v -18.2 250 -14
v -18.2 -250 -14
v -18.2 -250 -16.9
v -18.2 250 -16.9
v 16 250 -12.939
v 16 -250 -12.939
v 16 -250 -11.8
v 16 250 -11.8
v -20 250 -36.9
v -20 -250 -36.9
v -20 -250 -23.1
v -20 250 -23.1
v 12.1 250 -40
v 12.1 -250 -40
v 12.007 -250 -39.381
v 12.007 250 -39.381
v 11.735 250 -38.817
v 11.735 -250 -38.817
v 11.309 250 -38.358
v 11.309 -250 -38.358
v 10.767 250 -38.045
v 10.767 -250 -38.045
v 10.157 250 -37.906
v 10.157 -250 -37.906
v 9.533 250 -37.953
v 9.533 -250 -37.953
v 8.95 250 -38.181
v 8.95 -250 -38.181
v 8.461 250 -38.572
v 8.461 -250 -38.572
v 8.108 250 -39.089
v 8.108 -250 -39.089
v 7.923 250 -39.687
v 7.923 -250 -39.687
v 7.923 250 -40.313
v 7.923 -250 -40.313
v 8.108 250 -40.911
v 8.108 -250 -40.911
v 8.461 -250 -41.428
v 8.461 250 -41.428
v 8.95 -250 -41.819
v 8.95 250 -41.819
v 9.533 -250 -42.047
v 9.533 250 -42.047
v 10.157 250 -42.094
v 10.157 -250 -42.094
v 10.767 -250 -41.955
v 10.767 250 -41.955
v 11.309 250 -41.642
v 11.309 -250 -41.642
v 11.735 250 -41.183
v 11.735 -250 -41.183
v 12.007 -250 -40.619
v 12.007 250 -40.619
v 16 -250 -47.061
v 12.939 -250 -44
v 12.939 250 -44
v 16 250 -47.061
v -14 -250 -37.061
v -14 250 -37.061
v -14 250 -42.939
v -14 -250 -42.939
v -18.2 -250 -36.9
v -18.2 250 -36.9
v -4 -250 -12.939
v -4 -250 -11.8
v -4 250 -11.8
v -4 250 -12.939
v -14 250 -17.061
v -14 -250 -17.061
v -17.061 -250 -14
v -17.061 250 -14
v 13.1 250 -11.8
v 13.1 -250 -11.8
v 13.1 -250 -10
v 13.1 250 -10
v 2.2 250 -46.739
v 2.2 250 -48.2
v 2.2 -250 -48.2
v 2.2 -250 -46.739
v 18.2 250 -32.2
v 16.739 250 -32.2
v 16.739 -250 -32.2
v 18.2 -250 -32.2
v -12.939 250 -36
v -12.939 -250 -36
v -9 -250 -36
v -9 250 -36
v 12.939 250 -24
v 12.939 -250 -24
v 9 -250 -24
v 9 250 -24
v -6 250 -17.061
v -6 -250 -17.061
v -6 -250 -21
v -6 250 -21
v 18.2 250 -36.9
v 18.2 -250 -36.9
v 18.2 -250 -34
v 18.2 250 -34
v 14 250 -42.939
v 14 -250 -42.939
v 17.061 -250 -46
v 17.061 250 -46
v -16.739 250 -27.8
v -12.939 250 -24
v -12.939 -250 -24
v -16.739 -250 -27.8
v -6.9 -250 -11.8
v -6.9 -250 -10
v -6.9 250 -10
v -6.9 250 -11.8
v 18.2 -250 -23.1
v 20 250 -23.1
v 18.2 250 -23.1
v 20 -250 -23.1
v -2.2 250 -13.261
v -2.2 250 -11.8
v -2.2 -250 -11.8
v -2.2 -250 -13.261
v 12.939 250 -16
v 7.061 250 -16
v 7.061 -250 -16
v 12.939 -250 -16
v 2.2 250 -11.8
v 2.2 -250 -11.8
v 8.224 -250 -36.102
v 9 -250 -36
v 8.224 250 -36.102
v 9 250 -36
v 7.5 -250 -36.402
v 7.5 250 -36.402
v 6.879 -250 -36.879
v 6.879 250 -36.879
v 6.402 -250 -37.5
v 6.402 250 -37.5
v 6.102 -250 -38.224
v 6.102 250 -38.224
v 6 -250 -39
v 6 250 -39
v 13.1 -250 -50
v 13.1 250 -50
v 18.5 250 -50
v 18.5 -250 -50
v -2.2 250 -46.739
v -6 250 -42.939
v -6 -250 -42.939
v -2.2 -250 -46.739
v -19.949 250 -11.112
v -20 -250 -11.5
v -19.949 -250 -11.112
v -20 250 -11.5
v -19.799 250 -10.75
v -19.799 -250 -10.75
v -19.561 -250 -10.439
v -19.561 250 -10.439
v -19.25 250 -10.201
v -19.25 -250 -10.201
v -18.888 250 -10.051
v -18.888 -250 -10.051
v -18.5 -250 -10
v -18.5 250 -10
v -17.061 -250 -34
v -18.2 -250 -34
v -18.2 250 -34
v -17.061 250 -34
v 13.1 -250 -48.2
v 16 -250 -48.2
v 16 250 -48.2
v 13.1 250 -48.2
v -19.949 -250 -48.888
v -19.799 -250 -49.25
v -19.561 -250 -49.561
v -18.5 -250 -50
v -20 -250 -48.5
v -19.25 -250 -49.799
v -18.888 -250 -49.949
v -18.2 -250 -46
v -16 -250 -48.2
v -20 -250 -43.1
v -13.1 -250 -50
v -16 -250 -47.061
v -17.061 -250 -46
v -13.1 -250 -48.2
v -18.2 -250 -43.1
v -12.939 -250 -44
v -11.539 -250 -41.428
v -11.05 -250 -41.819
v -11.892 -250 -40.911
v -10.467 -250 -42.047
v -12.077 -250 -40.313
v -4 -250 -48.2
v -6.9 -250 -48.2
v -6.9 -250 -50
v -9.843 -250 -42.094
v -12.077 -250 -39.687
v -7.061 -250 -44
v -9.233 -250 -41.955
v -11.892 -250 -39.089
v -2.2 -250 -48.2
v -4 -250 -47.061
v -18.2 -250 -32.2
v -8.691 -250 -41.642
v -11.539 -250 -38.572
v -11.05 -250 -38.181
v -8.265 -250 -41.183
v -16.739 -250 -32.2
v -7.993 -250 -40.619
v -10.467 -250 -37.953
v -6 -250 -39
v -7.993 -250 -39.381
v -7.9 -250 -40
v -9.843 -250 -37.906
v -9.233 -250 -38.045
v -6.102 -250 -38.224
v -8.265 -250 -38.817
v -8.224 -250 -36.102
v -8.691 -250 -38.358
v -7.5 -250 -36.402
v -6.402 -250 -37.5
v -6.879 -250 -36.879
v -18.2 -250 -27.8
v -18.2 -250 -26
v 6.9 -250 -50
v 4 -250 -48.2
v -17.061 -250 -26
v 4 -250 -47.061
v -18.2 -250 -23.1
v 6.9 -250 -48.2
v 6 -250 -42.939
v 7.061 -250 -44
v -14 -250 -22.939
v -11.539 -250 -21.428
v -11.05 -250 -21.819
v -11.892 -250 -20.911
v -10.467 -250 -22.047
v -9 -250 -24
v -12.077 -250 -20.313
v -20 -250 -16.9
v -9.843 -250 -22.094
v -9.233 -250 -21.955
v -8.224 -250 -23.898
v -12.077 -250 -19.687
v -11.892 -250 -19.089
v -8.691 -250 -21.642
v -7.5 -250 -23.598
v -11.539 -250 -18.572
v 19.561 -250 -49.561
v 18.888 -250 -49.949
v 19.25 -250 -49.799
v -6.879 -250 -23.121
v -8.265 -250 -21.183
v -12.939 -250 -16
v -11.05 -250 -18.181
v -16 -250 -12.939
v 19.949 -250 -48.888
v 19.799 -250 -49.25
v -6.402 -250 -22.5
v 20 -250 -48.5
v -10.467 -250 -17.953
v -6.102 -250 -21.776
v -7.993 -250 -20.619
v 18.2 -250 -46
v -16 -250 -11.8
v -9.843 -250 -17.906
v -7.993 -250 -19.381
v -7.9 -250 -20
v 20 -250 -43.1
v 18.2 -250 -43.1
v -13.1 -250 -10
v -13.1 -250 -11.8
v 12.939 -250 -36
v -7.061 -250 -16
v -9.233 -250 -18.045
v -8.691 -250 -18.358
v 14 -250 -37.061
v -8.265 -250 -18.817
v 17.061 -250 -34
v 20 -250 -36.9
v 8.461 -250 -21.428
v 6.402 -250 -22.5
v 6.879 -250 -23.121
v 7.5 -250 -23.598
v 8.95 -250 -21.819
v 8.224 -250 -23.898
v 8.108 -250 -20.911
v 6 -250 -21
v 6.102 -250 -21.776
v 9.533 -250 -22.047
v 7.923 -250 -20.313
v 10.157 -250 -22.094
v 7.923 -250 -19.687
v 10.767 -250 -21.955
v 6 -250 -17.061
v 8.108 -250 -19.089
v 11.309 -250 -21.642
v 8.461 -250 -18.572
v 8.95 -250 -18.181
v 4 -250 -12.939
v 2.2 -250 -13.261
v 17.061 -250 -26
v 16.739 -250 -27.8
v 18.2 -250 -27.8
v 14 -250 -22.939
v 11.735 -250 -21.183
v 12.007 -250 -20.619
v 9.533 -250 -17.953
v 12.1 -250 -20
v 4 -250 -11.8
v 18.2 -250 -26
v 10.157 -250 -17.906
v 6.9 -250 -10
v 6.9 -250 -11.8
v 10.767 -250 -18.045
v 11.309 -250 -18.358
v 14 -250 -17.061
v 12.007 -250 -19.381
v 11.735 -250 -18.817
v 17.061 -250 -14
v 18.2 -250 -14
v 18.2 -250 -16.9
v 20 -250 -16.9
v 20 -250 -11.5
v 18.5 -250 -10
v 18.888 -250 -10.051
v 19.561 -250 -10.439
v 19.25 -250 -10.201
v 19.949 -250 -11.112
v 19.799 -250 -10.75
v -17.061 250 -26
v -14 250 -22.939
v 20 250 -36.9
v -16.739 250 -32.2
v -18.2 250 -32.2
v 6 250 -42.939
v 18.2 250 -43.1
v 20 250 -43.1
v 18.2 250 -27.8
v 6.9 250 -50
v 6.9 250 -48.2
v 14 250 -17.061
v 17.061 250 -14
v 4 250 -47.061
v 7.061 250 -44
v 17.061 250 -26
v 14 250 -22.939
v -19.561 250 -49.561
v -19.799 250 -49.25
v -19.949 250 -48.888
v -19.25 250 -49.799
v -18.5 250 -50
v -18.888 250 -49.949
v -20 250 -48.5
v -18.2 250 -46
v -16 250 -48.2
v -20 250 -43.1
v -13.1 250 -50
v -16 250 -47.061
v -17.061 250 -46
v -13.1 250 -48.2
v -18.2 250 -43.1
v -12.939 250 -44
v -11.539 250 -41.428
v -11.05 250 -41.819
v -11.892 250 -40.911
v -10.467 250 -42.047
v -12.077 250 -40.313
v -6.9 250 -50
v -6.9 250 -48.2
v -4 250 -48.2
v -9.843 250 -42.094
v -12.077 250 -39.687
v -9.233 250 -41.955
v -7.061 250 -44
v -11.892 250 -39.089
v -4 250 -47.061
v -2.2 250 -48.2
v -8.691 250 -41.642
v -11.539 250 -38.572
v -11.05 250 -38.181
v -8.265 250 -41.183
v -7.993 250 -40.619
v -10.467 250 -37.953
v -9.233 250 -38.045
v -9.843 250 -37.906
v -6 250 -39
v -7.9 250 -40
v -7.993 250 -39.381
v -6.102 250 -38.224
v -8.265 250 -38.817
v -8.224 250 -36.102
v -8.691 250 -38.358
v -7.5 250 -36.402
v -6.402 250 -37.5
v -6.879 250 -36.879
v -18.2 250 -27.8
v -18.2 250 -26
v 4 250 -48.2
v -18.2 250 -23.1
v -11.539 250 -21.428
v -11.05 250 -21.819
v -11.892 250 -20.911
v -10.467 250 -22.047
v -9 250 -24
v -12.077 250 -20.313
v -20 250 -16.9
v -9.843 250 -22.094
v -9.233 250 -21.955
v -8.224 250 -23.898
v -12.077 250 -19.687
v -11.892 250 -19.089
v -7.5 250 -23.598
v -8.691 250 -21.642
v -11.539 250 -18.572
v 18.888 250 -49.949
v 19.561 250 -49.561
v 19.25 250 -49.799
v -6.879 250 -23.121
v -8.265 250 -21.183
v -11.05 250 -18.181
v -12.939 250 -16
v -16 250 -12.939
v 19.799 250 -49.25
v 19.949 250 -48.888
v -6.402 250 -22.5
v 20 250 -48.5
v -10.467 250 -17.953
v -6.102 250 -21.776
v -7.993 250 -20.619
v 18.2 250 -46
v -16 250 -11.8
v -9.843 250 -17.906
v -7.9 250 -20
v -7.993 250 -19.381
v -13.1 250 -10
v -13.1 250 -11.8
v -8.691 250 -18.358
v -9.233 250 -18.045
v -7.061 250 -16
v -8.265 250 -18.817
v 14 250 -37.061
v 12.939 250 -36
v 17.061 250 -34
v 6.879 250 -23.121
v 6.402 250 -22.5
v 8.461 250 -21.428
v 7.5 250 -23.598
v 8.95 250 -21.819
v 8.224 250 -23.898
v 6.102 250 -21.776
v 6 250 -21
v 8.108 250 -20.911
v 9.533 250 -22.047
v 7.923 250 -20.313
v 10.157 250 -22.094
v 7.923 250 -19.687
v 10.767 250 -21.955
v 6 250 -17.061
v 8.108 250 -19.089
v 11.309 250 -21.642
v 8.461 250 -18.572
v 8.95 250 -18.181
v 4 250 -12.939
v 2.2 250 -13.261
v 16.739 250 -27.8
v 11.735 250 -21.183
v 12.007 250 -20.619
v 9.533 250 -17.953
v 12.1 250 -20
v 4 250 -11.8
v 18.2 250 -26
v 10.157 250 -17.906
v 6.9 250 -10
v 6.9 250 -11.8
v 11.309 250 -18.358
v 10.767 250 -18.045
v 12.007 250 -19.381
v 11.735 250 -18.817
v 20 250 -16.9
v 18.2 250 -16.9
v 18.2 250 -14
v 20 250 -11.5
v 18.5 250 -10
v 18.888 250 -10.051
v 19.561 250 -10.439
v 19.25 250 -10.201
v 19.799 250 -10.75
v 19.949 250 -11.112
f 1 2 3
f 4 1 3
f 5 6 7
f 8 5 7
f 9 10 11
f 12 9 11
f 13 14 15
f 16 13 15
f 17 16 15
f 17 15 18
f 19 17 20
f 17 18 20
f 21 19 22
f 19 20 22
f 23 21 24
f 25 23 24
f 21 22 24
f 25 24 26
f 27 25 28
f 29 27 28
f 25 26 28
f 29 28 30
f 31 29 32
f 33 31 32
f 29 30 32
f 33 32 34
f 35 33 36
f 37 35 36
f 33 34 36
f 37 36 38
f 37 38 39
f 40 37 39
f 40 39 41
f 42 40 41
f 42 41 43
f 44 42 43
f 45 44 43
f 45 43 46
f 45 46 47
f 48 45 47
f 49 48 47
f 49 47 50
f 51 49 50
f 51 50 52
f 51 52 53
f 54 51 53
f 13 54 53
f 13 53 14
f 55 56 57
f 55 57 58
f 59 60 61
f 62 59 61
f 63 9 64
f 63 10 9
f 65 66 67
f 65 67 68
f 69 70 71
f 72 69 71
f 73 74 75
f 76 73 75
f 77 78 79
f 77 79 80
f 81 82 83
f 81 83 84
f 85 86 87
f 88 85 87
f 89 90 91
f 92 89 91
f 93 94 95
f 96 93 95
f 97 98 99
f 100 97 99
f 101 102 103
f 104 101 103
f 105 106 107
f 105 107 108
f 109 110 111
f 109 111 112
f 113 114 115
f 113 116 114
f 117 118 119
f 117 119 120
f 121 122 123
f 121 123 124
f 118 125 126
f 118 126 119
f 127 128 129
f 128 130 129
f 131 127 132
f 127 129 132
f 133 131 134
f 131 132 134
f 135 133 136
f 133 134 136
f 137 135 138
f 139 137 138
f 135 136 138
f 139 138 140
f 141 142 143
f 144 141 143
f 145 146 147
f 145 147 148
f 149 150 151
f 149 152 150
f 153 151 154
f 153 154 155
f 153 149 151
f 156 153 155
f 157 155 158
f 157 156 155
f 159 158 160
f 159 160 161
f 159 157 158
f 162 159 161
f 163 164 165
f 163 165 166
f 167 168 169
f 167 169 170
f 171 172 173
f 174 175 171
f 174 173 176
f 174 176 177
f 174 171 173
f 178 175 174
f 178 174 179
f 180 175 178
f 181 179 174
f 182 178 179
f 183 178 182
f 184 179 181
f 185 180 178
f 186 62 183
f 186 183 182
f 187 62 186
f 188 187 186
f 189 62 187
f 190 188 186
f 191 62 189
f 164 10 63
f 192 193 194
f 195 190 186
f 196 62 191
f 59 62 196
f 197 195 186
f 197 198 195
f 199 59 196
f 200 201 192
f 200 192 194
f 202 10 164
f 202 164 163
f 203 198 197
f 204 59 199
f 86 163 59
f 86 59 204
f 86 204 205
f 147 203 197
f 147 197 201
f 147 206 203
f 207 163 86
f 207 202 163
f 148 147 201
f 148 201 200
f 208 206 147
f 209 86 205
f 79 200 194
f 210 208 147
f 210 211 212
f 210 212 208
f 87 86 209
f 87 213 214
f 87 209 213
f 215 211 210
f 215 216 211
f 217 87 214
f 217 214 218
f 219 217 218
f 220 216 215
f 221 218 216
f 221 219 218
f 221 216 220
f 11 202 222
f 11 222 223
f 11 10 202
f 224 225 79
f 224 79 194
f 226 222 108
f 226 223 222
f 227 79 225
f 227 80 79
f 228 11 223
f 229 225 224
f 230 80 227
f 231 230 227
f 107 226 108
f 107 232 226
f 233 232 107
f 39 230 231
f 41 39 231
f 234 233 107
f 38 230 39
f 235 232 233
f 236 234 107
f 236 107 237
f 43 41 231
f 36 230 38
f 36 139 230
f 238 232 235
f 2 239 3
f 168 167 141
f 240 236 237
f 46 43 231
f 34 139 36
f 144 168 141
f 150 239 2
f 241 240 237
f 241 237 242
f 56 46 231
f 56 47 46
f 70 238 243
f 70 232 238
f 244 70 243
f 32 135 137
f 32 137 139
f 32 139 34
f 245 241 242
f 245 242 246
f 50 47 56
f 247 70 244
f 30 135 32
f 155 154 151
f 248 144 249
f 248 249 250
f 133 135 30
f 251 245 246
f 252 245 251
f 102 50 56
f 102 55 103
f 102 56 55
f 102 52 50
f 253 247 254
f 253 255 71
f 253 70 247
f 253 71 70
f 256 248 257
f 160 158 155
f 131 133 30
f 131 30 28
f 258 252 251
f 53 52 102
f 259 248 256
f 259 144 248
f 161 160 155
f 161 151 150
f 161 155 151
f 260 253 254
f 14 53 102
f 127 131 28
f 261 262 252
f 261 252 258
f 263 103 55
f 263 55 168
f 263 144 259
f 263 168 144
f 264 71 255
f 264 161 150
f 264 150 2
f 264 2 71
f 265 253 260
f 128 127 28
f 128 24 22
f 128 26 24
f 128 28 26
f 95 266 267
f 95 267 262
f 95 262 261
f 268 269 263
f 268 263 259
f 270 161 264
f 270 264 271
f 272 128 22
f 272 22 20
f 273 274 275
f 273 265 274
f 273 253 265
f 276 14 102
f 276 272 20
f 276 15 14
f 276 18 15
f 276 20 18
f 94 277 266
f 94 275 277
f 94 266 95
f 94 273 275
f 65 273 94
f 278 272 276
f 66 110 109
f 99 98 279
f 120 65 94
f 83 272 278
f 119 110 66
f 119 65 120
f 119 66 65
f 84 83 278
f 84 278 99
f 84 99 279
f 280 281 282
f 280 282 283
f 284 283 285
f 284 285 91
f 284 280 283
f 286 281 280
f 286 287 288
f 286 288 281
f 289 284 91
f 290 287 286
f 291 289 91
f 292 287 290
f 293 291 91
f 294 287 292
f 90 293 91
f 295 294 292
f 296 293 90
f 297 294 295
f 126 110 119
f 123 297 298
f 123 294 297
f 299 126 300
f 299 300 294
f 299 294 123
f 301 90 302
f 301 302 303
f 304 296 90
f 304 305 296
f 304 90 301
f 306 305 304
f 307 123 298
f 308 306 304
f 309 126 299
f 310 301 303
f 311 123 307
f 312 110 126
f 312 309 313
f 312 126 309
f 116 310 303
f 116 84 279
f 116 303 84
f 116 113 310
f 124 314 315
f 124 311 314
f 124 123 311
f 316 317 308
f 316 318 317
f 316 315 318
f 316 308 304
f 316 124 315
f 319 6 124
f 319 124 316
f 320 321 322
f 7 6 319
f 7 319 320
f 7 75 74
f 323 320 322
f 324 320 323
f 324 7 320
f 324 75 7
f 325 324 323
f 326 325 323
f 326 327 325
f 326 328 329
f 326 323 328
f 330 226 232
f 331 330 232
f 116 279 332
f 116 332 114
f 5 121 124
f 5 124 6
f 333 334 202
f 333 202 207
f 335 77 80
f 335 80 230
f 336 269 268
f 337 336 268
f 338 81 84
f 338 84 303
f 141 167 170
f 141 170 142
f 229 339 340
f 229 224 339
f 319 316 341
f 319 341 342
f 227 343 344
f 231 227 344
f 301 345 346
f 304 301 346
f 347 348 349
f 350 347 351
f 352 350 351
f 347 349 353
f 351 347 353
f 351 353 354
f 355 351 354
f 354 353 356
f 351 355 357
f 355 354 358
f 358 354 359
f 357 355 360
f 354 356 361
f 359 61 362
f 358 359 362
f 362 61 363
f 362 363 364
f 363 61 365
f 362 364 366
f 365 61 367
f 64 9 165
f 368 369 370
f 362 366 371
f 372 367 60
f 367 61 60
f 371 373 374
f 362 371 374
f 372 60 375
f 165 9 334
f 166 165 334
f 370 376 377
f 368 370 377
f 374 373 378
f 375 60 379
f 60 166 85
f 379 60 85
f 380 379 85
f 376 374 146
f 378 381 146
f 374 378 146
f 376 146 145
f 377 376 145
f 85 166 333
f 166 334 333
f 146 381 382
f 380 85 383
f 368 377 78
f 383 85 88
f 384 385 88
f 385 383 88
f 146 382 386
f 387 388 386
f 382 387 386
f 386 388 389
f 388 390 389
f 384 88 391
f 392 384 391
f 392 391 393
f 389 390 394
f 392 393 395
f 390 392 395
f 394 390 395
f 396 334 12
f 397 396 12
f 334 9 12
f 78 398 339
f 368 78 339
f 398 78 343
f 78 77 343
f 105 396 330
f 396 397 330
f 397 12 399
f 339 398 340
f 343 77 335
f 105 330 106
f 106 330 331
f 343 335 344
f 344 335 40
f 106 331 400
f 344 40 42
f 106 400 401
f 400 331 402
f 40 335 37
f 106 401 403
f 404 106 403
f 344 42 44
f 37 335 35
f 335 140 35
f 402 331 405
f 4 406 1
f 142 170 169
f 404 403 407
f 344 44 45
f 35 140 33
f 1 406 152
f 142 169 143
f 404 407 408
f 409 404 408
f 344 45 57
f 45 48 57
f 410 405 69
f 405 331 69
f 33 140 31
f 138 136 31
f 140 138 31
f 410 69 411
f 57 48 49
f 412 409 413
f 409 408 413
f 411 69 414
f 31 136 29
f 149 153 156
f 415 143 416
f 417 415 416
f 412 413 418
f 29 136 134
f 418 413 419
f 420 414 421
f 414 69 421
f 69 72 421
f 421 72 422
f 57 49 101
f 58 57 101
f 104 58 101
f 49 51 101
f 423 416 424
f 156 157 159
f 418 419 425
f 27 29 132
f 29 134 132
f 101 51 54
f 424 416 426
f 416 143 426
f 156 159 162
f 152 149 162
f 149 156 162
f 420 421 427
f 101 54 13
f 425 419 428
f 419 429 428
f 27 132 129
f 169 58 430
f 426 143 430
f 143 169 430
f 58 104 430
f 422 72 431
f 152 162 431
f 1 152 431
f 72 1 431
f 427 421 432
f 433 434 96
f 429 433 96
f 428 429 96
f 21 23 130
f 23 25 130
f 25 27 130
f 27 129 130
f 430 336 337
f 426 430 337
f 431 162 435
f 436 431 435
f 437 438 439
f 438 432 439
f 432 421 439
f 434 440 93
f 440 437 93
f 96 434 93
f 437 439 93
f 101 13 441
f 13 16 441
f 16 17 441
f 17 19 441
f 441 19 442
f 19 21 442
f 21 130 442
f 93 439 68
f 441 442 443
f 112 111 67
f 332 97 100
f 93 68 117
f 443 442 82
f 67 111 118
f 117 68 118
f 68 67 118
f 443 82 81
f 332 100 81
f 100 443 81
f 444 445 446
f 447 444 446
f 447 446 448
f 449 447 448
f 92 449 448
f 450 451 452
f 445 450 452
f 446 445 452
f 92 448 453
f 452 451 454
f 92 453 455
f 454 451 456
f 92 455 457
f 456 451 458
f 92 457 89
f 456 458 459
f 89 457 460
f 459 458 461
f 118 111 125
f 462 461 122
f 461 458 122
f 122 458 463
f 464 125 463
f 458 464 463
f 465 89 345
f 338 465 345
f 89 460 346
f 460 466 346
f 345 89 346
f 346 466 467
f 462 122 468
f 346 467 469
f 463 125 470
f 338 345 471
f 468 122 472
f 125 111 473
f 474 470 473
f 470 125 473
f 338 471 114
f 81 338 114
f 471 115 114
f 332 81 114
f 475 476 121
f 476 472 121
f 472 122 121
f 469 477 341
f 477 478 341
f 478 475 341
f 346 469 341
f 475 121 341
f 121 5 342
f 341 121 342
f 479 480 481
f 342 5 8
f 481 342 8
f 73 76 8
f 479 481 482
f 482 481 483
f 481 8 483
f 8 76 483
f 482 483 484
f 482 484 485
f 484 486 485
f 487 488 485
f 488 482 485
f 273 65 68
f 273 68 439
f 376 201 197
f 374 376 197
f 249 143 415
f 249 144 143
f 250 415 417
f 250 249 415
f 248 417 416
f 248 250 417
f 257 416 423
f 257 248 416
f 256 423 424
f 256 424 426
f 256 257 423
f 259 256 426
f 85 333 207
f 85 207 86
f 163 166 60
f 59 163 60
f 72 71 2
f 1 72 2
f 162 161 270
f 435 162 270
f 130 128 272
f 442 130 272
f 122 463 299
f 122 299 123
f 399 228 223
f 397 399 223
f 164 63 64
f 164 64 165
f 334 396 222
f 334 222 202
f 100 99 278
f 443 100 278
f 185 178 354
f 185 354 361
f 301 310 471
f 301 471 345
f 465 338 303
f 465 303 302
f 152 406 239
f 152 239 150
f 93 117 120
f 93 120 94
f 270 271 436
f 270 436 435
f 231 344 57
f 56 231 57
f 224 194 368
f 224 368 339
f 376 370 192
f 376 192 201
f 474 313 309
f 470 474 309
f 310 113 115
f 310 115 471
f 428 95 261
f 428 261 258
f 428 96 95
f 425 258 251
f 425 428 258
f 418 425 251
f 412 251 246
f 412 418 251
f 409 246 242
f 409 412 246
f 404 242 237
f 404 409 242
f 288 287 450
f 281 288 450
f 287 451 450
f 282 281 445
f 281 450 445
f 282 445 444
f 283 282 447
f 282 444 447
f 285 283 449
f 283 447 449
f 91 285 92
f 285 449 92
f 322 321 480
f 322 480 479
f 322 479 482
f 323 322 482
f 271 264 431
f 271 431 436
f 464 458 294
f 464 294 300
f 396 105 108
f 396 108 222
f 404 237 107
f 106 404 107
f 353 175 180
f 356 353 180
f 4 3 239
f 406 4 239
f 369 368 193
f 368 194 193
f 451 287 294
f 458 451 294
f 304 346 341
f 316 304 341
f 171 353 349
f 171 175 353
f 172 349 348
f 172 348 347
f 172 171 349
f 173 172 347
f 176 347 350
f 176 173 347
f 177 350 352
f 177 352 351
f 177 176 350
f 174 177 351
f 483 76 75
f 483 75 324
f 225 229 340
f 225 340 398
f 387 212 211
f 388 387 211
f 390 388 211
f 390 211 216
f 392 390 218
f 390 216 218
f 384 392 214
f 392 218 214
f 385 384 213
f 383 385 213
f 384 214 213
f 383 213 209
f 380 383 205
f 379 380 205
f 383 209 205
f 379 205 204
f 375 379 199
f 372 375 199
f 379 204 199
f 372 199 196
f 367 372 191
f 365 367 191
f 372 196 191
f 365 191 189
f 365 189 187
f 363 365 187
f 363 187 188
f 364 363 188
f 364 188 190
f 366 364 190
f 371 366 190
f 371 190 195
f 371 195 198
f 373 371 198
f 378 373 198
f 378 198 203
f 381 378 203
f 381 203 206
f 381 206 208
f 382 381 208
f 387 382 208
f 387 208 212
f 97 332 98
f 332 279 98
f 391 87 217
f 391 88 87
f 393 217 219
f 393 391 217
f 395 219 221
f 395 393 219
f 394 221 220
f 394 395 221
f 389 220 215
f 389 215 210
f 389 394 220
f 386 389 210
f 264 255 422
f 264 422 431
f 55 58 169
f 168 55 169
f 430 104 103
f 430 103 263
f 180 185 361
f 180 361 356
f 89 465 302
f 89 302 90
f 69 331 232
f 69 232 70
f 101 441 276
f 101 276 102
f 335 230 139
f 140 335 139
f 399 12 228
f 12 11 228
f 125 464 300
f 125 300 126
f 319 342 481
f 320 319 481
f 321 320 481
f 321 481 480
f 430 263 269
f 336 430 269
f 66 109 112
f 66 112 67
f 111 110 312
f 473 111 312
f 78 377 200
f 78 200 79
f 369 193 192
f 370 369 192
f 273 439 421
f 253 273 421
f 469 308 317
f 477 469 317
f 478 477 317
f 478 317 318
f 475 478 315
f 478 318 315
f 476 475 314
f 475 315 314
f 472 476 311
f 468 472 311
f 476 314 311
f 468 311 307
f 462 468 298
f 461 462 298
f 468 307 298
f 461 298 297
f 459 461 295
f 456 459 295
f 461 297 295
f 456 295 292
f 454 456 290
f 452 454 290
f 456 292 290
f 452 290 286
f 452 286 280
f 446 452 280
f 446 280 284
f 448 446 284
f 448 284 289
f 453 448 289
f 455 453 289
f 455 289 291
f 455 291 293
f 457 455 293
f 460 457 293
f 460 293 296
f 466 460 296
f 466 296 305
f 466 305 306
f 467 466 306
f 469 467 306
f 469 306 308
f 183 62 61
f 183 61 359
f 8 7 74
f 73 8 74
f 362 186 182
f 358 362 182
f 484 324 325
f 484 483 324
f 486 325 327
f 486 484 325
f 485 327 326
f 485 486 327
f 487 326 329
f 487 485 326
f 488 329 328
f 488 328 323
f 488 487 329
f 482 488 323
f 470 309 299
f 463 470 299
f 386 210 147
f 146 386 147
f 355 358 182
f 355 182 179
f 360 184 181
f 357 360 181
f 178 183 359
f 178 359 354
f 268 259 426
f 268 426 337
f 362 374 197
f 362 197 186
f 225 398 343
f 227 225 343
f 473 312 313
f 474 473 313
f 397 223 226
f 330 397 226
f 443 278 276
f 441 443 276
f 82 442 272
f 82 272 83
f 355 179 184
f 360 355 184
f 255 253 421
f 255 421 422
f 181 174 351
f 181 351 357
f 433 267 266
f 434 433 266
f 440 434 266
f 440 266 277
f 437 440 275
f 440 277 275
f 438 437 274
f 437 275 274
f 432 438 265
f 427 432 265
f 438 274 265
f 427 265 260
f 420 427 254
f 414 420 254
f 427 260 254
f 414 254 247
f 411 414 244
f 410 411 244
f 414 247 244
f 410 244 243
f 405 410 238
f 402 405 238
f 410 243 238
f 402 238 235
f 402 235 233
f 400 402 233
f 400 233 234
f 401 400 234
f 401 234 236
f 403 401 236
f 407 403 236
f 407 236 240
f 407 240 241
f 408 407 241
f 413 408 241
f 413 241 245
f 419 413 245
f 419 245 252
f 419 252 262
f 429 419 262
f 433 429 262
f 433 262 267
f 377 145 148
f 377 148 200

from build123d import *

# Parameters (mm, degrees)
SKETCH013_W           = 40
SKETCH013_H           = 40
PAD007_DEPTH          = 250
POCKET006_DEPTH       = 1256.38065
POCKET006_DEPTH_BACK  = 1256.38065
POLARPATTERN001_COUNT = 4
POCKET007_DEPTH       = 250.001
POCKET007_DEPTH_BACK  = 250.001
SKETCH012_R           = 2.1
POCKET005_DEPTH       = 500.001
FILLET002_R           = 1.5
FILLET003_R           = 3


with BuildPart() as part:
    # Sketch013 → Pad007 (new body, symmetric)
    with BuildSketch(Plane.XZ):
        Rectangle(SKETCH013_W, SKETCH013_H)
    extrude(amount=PAD007_DEPTH, both=True)

    # Sketch014 → Pocket006 (cut, two sides)
    with BuildSketch(Plane(origin=(-10, 0, 0), x_dir=(1, 0, 0), z_dir=(0, -1, 0))) as pocket006_sk:
        Polygon((-3.1, 21), (3.1, 21), (3.1, 18.2), (6, 18.2), (6, 17.06066), (2.93934, 14), (-2.93934, 14), (-6, 17.06066), (-6, 18.2), (-3.1, 18.2), align=None)
        Polygon((16.9, 21), (16.9, 18.2), (14, 18.2), (14, 17.06066), (17.06066, 14), (22.93934, 14), (26, 17.06066), (26, 18.2), (23.1, 18.2), (23.1, 21), align=None)
    pocket006 = extrude(amount=-POCKET006_DEPTH, mode=Mode.SUBTRACT) + extrude(pocket006_sk.sketch, amount=POCKET006_DEPTH_BACK, mode=Mode.SUBTRACT)

    # PolarPattern001: Pocket006 ×4 about axis
    polarpattern001_axis = Axis((0, 0, 0), (0, 1, 0))
    for i in range(1, POLARPATTERN001_COUNT):
        add(pocket006.rotate(polarpattern001_axis, i * 360 / POLARPATTERN001_COUNT), mode=Mode.SUBTRACT)

    # Sketch015 → Pocket007 (cut, two sides)
    with BuildSketch(Plane.XZ) as pocket007_sk:
        Polygon((2.2, 18.2), (-2.2, 18.2), (-2.2, 16.73934), (-6, 12.93934), (-6, 6), (-12.93934, 6), (-16.73934, 2.2), (-18.2, 2.2), (-18.2, -2.2), (-16.73934, -2.2), (-12.93934, -6), (-6, -6), (-6, -12.93934), (-2.2, -16.73934), (-2.2, -18.2), (2.2, -18.2), (2.2, -16.73934), (6, -12.93934), (6, -6), (12.93934, -6), (16.73934, -2.2), (18.2, -2.2), (18.2, 2.2), (16.73934, 2.2), (12.93934, 6), (6, 6), (6, 12.93934), (2.2, 16.73934), align=None)
    extrude(amount=-POCKET007_DEPTH, mode=Mode.SUBTRACT)
    extrude(pocket007_sk.sketch, amount=POCKET007_DEPTH_BACK, mode=Mode.SUBTRACT)

    # Sketch012 → Pocket005 (cut, through all)
    with BuildSketch(Plane.XZ.offset(250)):
        with Locations((-10, 10)):
            Circle(SKETCH012_R)
        with Locations((10, 10)):
            Circle(SKETCH012_R)
        with Locations((10, -10)):
            Circle(SKETCH012_R)
        with Locations((-10, -10)):
            Circle(SKETCH012_R)
    extrude(amount=-POCKET005_DEPTH, mode=Mode.SUBTRACT)

    # Fillet002
    fillet002_edges = [part.edges().sort_by_distance(p)[0] for p in [
        (-20, 0, 20),
        (20, 0, -20),
        (-20, 0, -20),
        (20, 0, 20),
    ]]
    fillet(fillet002_edges, radius=FILLET002_R)

    # Fillet003
    fillet003_edges = [part.edges().sort_by_distance(p)[0] for p in [
        (-6, 0, 6),
        (-6, 0, -6),
        (6, 0, -6),
        (6, 0, 6),
    ]]
    fillet(fillet003_edges, radius=FILLET003_R)


with BuildPart() as part_1:
    # Body008 placement: moved
    add(part.part.moved(Location((0, 0, -30))))


solid = part_1.part
